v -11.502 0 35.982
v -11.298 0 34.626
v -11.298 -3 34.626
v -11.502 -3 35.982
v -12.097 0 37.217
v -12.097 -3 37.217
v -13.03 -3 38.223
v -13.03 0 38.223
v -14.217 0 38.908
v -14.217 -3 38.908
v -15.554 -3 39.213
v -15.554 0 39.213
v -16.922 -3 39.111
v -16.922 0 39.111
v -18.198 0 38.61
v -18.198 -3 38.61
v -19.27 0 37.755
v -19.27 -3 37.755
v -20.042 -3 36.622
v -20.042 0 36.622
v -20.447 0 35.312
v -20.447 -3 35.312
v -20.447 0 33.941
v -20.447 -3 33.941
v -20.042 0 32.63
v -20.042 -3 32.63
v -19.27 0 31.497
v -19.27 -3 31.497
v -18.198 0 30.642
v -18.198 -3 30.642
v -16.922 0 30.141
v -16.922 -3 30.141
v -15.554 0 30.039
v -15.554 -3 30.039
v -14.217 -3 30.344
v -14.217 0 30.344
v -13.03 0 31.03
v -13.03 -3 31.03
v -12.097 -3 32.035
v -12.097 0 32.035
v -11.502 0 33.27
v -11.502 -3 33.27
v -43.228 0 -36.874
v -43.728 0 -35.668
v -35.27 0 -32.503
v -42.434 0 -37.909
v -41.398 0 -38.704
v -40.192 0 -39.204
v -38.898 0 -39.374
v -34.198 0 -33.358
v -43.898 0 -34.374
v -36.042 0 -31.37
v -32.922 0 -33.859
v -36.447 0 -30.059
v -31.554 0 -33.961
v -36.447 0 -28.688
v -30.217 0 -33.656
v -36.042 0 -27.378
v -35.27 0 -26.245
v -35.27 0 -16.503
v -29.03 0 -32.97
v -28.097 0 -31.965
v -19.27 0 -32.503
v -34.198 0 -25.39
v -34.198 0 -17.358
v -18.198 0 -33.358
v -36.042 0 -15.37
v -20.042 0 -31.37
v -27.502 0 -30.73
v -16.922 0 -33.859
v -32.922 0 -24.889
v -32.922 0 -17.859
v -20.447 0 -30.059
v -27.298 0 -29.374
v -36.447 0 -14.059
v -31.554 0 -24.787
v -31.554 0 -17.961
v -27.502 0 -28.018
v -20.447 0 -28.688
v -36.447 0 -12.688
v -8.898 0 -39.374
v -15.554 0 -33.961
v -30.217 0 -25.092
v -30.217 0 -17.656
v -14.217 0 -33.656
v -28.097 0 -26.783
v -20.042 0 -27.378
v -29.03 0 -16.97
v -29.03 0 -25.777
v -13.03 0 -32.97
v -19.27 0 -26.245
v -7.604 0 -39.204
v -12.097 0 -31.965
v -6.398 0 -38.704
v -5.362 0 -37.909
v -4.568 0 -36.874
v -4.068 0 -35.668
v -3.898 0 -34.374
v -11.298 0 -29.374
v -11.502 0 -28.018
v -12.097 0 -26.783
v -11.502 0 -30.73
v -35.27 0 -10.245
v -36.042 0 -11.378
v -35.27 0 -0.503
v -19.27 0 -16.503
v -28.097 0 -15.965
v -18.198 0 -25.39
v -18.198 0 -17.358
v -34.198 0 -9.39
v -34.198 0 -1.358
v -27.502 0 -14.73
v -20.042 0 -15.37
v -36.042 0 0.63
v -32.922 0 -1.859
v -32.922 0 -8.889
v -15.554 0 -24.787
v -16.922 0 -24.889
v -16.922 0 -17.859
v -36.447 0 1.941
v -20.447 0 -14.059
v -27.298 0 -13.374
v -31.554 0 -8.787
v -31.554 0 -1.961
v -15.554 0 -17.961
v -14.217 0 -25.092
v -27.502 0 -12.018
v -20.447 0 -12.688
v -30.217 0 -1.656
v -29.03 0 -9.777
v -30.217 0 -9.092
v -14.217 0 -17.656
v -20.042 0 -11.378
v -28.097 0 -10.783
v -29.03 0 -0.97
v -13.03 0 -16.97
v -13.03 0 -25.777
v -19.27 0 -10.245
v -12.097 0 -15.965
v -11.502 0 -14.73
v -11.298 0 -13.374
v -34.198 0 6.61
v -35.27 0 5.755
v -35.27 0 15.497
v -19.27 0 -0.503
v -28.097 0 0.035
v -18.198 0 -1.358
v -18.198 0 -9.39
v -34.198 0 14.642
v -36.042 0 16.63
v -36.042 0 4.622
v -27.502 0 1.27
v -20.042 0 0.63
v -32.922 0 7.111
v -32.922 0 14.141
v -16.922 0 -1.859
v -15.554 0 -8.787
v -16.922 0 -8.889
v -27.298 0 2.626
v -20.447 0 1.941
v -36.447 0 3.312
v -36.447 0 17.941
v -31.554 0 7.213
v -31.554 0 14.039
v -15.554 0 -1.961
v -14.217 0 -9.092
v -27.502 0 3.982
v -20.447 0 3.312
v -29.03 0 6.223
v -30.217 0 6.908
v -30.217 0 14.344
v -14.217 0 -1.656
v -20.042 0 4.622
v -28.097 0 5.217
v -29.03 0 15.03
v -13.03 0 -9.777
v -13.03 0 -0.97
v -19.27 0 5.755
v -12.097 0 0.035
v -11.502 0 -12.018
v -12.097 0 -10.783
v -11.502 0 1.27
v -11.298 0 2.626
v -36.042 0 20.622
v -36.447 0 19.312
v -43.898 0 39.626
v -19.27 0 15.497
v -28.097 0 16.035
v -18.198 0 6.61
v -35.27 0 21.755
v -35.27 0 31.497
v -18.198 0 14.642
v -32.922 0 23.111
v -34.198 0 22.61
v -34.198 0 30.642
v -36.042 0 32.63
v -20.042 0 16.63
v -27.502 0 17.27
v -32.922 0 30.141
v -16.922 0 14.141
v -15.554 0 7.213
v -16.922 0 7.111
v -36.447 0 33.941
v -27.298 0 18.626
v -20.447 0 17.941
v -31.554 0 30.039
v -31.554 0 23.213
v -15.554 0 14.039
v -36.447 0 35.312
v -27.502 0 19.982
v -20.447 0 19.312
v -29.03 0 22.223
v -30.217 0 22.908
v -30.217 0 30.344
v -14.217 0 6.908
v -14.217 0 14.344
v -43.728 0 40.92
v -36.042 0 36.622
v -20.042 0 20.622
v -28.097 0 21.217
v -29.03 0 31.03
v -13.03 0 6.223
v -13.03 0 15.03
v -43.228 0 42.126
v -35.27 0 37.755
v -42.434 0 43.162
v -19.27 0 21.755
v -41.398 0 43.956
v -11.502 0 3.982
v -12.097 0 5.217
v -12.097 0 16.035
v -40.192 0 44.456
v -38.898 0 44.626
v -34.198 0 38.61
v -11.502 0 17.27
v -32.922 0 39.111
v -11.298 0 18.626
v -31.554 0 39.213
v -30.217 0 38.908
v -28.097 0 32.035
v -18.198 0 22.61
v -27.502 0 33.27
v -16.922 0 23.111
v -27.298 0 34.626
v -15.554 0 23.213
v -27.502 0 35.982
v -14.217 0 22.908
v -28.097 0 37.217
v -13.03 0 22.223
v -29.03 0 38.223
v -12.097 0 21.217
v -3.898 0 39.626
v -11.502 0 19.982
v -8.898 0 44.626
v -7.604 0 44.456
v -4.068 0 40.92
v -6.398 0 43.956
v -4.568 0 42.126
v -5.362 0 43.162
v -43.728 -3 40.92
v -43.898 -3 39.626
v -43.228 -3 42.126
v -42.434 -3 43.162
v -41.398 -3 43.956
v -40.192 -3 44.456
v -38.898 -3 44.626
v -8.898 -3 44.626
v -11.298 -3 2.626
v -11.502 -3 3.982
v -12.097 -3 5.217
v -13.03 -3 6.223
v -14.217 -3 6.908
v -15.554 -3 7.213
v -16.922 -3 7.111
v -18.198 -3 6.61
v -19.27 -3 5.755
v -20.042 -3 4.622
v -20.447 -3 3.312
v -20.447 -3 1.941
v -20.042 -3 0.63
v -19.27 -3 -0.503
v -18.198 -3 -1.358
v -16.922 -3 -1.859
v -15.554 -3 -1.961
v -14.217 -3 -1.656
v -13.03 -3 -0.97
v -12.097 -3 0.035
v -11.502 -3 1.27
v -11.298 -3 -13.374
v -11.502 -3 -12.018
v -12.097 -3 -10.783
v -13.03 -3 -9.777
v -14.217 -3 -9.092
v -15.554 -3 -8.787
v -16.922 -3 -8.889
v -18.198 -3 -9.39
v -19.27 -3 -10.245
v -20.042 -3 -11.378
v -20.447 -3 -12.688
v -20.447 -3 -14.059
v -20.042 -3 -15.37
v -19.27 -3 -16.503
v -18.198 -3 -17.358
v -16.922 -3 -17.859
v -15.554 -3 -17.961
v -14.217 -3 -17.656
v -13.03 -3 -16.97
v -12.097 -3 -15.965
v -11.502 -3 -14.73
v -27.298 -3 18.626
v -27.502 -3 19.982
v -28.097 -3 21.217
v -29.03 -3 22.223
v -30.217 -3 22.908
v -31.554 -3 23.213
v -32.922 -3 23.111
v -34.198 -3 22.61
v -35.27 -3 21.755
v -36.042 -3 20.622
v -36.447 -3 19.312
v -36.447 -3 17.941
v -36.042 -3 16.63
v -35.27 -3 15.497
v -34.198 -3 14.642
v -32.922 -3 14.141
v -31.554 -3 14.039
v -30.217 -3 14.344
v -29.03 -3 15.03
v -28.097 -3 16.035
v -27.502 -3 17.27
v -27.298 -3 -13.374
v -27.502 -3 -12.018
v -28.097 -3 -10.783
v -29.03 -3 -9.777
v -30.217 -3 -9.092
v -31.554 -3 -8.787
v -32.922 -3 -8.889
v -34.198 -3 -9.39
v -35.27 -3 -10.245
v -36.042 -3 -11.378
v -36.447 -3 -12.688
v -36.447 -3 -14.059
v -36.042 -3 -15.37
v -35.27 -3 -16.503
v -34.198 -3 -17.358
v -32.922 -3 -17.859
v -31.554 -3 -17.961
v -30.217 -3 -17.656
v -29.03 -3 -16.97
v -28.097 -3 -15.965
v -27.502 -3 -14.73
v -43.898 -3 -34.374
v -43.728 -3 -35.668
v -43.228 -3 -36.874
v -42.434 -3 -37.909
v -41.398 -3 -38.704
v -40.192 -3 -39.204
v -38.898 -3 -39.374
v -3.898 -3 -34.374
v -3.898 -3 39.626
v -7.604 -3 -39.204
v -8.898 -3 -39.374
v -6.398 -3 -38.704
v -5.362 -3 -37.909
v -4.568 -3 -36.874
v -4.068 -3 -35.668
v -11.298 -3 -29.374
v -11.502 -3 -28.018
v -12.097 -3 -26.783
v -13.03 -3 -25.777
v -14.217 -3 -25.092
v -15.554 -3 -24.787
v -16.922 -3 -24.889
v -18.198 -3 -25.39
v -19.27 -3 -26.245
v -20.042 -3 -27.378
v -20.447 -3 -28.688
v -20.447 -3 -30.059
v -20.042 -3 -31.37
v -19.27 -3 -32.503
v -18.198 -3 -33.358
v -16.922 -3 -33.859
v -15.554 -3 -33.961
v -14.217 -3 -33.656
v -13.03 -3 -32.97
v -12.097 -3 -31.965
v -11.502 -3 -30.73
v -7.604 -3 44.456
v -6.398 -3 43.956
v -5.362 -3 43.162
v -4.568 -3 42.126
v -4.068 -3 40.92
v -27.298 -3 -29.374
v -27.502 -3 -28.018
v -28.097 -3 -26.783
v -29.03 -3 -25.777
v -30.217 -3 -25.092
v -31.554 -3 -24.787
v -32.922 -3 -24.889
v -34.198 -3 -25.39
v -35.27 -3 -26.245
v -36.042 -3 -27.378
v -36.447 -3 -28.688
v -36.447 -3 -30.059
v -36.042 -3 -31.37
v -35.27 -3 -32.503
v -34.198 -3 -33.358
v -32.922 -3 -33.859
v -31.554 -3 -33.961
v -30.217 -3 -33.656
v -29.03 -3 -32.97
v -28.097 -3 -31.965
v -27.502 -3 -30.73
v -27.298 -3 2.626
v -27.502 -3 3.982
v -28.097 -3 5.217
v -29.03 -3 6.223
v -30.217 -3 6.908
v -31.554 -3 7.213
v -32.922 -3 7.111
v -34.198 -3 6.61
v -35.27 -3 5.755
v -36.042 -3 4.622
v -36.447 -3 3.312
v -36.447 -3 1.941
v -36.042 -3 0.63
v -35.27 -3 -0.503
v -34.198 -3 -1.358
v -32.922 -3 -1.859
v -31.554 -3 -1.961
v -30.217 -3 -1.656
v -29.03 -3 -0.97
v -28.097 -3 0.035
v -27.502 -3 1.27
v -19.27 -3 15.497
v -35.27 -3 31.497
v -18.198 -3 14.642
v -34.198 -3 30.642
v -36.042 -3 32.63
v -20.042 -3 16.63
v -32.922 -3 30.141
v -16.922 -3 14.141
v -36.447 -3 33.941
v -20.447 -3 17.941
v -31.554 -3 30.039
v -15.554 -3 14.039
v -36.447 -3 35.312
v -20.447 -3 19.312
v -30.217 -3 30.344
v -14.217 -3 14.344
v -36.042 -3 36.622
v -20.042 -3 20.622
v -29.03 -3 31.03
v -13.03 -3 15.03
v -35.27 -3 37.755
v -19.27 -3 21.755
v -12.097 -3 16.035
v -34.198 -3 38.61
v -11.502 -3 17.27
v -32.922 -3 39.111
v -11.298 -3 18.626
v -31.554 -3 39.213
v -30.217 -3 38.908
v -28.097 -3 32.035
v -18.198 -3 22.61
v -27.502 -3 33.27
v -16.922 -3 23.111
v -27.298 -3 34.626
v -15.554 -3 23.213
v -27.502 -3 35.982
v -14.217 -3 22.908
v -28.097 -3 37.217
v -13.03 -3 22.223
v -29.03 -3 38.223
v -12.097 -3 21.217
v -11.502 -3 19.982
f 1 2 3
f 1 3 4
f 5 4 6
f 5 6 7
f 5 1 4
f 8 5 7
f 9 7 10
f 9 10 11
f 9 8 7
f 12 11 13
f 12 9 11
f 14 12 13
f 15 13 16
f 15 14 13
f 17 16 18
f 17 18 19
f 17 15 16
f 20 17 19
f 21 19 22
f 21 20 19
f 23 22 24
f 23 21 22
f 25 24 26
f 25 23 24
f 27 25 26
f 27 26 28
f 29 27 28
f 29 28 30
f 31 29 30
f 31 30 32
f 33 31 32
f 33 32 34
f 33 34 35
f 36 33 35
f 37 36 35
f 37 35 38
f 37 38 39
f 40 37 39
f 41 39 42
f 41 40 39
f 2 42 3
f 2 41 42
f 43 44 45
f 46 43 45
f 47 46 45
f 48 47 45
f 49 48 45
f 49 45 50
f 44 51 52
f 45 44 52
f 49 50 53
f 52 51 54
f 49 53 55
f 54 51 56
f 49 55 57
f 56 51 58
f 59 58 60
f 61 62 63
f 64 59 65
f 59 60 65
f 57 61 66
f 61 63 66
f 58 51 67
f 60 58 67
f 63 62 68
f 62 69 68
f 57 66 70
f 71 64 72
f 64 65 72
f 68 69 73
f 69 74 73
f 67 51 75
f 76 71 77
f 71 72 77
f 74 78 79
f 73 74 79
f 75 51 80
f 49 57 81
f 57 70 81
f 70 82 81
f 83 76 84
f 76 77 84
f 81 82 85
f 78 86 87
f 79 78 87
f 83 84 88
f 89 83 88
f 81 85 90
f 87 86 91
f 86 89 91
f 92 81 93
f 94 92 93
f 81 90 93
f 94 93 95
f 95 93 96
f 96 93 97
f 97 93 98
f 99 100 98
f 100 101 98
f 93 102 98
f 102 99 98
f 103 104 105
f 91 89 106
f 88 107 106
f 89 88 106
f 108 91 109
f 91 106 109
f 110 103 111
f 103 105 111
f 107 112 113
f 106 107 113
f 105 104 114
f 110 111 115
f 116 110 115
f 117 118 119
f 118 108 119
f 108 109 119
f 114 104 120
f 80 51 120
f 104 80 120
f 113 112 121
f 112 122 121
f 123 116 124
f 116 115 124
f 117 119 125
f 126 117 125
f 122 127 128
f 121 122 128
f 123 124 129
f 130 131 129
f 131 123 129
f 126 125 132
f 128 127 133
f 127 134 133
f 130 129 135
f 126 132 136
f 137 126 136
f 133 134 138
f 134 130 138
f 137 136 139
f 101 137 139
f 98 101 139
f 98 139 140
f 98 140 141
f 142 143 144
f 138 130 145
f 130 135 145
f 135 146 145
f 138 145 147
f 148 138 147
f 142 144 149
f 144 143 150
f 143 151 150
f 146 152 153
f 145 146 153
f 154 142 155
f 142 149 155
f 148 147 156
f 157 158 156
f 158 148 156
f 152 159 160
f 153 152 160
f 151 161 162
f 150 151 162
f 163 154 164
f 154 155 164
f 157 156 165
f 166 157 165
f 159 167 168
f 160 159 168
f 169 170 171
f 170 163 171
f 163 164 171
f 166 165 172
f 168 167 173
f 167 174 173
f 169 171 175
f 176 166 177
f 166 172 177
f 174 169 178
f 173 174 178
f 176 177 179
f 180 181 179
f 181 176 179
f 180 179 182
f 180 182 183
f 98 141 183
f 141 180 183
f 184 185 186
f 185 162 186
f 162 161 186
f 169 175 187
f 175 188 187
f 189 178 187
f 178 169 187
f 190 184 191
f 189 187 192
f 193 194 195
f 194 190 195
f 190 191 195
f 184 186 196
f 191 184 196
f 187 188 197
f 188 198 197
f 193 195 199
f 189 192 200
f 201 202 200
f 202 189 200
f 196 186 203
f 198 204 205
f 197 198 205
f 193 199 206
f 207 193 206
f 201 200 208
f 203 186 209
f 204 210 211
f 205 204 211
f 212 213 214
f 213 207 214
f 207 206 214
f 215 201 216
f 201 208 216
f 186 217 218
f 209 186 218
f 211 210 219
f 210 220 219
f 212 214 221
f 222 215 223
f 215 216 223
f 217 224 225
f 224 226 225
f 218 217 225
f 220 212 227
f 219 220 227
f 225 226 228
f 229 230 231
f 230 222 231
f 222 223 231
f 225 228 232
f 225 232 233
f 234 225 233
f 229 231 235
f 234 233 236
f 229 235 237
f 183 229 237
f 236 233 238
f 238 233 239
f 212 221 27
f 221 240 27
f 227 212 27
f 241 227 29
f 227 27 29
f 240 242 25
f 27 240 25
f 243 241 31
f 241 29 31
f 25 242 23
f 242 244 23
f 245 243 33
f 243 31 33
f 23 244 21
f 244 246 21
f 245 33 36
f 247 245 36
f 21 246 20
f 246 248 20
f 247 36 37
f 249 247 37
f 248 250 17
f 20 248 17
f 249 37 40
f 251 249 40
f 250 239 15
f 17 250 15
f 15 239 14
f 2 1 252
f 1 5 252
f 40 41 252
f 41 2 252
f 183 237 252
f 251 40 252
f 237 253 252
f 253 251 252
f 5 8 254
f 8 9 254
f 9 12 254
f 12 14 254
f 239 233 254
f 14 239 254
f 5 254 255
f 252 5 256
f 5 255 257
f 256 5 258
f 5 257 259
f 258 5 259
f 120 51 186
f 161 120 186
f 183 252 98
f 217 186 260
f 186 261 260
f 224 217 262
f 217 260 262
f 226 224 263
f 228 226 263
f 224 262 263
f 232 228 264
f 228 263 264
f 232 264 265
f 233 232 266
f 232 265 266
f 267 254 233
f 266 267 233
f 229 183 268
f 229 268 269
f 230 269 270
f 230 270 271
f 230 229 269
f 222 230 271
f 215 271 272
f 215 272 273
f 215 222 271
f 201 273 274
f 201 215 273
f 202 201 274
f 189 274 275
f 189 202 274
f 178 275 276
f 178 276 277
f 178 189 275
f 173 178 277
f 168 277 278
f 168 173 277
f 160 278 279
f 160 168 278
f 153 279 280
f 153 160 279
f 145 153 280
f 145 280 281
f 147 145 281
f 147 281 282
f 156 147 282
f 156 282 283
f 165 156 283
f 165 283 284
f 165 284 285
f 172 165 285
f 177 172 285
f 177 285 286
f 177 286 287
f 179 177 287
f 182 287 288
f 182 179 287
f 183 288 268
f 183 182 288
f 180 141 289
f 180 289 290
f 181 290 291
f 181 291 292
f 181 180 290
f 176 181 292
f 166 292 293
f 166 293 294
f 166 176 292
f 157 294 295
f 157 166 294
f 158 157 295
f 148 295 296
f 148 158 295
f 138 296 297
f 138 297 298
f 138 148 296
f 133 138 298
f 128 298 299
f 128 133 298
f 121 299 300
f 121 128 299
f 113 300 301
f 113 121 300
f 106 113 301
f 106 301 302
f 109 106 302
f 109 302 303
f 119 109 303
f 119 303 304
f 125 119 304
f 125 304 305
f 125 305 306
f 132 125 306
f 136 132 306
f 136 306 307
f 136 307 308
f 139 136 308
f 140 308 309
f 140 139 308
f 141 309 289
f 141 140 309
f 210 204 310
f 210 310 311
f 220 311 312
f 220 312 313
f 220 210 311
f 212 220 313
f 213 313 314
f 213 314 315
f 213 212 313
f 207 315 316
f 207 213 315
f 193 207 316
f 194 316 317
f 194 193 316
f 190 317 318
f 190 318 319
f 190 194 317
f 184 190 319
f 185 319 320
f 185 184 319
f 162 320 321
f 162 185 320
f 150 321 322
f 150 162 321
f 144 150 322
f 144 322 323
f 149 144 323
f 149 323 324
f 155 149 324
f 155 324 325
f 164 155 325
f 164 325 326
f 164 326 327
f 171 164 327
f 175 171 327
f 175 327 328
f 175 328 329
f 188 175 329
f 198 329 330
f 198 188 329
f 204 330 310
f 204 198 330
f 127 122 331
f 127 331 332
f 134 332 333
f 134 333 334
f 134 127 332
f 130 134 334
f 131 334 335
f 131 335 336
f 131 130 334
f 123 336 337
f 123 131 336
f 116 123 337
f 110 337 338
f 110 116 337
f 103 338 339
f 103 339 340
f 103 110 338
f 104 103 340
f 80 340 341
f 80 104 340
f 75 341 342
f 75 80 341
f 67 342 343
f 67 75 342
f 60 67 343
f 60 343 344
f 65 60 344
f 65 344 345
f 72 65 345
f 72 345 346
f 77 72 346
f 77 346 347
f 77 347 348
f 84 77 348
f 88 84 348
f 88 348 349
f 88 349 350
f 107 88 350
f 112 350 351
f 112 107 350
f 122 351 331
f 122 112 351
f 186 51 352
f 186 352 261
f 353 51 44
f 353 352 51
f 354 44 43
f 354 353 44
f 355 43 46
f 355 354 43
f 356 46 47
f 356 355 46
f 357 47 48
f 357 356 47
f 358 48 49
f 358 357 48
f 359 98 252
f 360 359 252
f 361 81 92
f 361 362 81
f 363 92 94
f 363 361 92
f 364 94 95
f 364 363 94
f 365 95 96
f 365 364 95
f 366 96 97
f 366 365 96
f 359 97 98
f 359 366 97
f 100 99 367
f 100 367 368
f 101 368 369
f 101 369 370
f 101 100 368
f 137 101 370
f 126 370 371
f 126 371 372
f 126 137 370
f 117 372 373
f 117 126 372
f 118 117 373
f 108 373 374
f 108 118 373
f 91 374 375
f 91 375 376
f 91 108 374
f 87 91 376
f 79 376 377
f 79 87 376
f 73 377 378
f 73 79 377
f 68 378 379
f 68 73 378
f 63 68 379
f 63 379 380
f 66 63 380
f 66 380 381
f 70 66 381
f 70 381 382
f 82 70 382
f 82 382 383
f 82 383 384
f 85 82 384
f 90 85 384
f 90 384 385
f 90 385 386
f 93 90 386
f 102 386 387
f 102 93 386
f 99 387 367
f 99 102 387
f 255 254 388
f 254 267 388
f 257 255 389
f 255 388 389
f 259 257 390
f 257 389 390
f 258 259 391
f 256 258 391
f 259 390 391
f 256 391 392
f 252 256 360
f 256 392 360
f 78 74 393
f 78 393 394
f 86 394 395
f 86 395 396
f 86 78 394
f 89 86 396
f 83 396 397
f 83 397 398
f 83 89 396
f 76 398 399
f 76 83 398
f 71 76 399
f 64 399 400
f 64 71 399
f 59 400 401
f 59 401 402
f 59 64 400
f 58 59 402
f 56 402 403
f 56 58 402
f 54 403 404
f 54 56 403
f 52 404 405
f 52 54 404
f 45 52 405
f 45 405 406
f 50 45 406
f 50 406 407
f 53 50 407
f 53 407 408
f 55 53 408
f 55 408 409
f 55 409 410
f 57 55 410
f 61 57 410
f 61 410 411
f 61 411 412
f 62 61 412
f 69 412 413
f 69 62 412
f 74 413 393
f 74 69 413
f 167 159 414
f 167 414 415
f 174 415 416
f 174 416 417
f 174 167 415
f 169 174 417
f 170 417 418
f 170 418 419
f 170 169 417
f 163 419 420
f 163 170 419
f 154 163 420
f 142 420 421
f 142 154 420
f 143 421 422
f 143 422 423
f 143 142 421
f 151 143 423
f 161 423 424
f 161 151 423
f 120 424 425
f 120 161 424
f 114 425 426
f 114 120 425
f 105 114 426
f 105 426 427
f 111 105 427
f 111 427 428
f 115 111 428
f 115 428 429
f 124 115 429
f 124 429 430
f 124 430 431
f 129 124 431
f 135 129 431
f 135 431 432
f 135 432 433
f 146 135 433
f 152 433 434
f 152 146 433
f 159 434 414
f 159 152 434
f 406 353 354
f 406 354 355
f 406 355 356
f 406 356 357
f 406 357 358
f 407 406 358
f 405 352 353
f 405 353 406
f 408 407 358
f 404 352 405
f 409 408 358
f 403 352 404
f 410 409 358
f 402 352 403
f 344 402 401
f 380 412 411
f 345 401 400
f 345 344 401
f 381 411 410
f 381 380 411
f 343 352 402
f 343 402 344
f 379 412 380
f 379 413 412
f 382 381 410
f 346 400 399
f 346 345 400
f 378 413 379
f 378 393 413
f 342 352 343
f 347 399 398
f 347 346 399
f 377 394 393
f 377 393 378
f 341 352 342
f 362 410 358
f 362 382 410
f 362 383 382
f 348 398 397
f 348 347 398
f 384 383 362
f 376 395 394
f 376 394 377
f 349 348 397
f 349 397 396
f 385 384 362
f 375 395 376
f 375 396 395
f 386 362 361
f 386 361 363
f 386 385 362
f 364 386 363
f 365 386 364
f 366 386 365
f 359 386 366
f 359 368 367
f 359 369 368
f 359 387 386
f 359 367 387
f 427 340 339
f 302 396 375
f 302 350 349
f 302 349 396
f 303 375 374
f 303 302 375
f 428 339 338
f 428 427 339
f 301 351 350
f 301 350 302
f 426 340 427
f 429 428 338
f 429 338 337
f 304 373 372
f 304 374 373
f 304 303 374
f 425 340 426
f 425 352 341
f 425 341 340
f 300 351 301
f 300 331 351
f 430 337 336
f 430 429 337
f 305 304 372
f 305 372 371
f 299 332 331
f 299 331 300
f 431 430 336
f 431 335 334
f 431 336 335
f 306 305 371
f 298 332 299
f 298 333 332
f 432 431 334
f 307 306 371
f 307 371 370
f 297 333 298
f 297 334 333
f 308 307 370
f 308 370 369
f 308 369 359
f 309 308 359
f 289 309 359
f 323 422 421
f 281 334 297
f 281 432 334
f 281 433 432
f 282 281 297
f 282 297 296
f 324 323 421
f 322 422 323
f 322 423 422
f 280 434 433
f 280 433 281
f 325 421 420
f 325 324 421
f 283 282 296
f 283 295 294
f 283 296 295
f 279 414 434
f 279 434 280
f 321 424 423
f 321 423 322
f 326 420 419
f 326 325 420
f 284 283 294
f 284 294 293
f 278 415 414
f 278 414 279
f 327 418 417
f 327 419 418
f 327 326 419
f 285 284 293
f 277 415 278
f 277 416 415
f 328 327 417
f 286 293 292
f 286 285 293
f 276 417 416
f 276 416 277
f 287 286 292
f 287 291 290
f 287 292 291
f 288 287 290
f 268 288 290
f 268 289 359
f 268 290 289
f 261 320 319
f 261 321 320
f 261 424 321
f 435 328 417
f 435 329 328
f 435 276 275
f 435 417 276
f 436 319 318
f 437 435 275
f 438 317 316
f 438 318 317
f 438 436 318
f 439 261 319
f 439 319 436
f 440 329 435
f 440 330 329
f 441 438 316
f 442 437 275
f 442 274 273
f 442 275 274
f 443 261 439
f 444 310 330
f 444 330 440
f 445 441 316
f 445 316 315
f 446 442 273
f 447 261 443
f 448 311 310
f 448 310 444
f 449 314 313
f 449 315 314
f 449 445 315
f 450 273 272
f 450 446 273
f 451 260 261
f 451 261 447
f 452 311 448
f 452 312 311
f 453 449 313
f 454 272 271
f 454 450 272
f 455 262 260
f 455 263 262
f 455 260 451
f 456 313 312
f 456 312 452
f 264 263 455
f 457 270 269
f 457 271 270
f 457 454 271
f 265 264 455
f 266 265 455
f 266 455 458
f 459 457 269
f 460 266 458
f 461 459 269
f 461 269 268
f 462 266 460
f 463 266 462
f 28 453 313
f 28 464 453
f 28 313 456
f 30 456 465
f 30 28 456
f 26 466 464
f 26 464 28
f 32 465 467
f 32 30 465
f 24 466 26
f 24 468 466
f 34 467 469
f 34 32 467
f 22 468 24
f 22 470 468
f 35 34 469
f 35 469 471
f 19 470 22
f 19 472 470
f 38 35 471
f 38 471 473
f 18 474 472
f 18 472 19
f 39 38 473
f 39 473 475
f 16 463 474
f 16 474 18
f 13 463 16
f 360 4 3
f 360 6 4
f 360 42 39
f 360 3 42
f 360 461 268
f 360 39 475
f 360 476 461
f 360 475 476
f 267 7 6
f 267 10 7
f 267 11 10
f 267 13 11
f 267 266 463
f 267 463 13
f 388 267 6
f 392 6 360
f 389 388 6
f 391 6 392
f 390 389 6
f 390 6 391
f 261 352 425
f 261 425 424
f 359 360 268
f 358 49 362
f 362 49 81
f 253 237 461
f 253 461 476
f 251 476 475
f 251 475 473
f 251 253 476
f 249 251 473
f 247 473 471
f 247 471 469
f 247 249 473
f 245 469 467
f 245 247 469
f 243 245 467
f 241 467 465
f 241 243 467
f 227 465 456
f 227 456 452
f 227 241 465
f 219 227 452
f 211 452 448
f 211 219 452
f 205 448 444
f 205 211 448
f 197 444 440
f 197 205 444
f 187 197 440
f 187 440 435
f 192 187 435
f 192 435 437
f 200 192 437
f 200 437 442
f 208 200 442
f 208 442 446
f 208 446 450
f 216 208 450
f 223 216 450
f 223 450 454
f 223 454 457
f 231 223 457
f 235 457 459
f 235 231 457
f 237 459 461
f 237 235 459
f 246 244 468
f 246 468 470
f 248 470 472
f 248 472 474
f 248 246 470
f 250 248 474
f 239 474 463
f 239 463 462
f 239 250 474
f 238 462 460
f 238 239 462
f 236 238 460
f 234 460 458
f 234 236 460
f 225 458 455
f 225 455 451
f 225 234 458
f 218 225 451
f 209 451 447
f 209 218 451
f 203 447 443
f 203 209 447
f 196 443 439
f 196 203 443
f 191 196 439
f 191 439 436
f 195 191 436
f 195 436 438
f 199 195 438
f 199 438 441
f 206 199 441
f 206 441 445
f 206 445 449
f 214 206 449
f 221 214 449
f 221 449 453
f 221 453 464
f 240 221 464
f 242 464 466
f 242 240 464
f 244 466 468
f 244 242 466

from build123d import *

# Parameters (mm, degrees)
F0_W     = 20
F0_H     = 84
F0_R     = 4.6
F1_DEPTH = 3
F2_R     = 5


with BuildPart() as f1:
    # F0 (on Front) → F1 (new body)
    with BuildSketch(Plane.XZ):
        with Locations((-33.898029, 2.626098)):
            Rectangle(F0_W, F0_H)
        with Locations((-31.898029, -29.373902)):
            Circle(F0_R, mode=Mode.SUBTRACT)
        with Locations((-31.898029, -13.373902)):
            Circle(F0_R, mode=Mode.SUBTRACT)
        with Locations((-31.898029, 2.626098)):
            Circle(F0_R, mode=Mode.SUBTRACT)
        with Locations((-31.898029, 18.626098)):
            Circle(F0_R, mode=Mode.SUBTRACT)
        with Locations((-31.898029, 34.626098)):
            Circle(F0_R, mode=Mode.SUBTRACT)
        with Locations((-13.898029, 2.626098)):
            Rectangle(F0_W, F0_H)
        with Locations((-15.898029, -29.373902)):
            Circle(F0_R, mode=Mode.SUBTRACT)
        with Locations((-15.898029, -13.373902)):
            Circle(F0_R, mode=Mode.SUBTRACT)
        with Locations((-15.898029, 2.626098)):
            Circle(F0_R, mode=Mode.SUBTRACT)
        with Locations((-15.898029, 18.626098)):
            Circle(F0_R, mode=Mode.SUBTRACT)
        with Locations((-15.898029, 34.626098)):
            Circle(F0_R, mode=Mode.SUBTRACT)
    extrude(amount=F1_DEPTH)

    # F2
    f2_edges = [f1.edges().sort_by_distance(p)[0] for p in [
        (-43.898029, -1.5, 44.626098),
        (-3.898029, -1.5, 44.626098),
        (-3.898029, -1.5, -39.373902),
        (-43.898029, -1.5, -39.373902),
    ]]
    fillet(f2_edges, radius=F2_R)


solid = f1.part
